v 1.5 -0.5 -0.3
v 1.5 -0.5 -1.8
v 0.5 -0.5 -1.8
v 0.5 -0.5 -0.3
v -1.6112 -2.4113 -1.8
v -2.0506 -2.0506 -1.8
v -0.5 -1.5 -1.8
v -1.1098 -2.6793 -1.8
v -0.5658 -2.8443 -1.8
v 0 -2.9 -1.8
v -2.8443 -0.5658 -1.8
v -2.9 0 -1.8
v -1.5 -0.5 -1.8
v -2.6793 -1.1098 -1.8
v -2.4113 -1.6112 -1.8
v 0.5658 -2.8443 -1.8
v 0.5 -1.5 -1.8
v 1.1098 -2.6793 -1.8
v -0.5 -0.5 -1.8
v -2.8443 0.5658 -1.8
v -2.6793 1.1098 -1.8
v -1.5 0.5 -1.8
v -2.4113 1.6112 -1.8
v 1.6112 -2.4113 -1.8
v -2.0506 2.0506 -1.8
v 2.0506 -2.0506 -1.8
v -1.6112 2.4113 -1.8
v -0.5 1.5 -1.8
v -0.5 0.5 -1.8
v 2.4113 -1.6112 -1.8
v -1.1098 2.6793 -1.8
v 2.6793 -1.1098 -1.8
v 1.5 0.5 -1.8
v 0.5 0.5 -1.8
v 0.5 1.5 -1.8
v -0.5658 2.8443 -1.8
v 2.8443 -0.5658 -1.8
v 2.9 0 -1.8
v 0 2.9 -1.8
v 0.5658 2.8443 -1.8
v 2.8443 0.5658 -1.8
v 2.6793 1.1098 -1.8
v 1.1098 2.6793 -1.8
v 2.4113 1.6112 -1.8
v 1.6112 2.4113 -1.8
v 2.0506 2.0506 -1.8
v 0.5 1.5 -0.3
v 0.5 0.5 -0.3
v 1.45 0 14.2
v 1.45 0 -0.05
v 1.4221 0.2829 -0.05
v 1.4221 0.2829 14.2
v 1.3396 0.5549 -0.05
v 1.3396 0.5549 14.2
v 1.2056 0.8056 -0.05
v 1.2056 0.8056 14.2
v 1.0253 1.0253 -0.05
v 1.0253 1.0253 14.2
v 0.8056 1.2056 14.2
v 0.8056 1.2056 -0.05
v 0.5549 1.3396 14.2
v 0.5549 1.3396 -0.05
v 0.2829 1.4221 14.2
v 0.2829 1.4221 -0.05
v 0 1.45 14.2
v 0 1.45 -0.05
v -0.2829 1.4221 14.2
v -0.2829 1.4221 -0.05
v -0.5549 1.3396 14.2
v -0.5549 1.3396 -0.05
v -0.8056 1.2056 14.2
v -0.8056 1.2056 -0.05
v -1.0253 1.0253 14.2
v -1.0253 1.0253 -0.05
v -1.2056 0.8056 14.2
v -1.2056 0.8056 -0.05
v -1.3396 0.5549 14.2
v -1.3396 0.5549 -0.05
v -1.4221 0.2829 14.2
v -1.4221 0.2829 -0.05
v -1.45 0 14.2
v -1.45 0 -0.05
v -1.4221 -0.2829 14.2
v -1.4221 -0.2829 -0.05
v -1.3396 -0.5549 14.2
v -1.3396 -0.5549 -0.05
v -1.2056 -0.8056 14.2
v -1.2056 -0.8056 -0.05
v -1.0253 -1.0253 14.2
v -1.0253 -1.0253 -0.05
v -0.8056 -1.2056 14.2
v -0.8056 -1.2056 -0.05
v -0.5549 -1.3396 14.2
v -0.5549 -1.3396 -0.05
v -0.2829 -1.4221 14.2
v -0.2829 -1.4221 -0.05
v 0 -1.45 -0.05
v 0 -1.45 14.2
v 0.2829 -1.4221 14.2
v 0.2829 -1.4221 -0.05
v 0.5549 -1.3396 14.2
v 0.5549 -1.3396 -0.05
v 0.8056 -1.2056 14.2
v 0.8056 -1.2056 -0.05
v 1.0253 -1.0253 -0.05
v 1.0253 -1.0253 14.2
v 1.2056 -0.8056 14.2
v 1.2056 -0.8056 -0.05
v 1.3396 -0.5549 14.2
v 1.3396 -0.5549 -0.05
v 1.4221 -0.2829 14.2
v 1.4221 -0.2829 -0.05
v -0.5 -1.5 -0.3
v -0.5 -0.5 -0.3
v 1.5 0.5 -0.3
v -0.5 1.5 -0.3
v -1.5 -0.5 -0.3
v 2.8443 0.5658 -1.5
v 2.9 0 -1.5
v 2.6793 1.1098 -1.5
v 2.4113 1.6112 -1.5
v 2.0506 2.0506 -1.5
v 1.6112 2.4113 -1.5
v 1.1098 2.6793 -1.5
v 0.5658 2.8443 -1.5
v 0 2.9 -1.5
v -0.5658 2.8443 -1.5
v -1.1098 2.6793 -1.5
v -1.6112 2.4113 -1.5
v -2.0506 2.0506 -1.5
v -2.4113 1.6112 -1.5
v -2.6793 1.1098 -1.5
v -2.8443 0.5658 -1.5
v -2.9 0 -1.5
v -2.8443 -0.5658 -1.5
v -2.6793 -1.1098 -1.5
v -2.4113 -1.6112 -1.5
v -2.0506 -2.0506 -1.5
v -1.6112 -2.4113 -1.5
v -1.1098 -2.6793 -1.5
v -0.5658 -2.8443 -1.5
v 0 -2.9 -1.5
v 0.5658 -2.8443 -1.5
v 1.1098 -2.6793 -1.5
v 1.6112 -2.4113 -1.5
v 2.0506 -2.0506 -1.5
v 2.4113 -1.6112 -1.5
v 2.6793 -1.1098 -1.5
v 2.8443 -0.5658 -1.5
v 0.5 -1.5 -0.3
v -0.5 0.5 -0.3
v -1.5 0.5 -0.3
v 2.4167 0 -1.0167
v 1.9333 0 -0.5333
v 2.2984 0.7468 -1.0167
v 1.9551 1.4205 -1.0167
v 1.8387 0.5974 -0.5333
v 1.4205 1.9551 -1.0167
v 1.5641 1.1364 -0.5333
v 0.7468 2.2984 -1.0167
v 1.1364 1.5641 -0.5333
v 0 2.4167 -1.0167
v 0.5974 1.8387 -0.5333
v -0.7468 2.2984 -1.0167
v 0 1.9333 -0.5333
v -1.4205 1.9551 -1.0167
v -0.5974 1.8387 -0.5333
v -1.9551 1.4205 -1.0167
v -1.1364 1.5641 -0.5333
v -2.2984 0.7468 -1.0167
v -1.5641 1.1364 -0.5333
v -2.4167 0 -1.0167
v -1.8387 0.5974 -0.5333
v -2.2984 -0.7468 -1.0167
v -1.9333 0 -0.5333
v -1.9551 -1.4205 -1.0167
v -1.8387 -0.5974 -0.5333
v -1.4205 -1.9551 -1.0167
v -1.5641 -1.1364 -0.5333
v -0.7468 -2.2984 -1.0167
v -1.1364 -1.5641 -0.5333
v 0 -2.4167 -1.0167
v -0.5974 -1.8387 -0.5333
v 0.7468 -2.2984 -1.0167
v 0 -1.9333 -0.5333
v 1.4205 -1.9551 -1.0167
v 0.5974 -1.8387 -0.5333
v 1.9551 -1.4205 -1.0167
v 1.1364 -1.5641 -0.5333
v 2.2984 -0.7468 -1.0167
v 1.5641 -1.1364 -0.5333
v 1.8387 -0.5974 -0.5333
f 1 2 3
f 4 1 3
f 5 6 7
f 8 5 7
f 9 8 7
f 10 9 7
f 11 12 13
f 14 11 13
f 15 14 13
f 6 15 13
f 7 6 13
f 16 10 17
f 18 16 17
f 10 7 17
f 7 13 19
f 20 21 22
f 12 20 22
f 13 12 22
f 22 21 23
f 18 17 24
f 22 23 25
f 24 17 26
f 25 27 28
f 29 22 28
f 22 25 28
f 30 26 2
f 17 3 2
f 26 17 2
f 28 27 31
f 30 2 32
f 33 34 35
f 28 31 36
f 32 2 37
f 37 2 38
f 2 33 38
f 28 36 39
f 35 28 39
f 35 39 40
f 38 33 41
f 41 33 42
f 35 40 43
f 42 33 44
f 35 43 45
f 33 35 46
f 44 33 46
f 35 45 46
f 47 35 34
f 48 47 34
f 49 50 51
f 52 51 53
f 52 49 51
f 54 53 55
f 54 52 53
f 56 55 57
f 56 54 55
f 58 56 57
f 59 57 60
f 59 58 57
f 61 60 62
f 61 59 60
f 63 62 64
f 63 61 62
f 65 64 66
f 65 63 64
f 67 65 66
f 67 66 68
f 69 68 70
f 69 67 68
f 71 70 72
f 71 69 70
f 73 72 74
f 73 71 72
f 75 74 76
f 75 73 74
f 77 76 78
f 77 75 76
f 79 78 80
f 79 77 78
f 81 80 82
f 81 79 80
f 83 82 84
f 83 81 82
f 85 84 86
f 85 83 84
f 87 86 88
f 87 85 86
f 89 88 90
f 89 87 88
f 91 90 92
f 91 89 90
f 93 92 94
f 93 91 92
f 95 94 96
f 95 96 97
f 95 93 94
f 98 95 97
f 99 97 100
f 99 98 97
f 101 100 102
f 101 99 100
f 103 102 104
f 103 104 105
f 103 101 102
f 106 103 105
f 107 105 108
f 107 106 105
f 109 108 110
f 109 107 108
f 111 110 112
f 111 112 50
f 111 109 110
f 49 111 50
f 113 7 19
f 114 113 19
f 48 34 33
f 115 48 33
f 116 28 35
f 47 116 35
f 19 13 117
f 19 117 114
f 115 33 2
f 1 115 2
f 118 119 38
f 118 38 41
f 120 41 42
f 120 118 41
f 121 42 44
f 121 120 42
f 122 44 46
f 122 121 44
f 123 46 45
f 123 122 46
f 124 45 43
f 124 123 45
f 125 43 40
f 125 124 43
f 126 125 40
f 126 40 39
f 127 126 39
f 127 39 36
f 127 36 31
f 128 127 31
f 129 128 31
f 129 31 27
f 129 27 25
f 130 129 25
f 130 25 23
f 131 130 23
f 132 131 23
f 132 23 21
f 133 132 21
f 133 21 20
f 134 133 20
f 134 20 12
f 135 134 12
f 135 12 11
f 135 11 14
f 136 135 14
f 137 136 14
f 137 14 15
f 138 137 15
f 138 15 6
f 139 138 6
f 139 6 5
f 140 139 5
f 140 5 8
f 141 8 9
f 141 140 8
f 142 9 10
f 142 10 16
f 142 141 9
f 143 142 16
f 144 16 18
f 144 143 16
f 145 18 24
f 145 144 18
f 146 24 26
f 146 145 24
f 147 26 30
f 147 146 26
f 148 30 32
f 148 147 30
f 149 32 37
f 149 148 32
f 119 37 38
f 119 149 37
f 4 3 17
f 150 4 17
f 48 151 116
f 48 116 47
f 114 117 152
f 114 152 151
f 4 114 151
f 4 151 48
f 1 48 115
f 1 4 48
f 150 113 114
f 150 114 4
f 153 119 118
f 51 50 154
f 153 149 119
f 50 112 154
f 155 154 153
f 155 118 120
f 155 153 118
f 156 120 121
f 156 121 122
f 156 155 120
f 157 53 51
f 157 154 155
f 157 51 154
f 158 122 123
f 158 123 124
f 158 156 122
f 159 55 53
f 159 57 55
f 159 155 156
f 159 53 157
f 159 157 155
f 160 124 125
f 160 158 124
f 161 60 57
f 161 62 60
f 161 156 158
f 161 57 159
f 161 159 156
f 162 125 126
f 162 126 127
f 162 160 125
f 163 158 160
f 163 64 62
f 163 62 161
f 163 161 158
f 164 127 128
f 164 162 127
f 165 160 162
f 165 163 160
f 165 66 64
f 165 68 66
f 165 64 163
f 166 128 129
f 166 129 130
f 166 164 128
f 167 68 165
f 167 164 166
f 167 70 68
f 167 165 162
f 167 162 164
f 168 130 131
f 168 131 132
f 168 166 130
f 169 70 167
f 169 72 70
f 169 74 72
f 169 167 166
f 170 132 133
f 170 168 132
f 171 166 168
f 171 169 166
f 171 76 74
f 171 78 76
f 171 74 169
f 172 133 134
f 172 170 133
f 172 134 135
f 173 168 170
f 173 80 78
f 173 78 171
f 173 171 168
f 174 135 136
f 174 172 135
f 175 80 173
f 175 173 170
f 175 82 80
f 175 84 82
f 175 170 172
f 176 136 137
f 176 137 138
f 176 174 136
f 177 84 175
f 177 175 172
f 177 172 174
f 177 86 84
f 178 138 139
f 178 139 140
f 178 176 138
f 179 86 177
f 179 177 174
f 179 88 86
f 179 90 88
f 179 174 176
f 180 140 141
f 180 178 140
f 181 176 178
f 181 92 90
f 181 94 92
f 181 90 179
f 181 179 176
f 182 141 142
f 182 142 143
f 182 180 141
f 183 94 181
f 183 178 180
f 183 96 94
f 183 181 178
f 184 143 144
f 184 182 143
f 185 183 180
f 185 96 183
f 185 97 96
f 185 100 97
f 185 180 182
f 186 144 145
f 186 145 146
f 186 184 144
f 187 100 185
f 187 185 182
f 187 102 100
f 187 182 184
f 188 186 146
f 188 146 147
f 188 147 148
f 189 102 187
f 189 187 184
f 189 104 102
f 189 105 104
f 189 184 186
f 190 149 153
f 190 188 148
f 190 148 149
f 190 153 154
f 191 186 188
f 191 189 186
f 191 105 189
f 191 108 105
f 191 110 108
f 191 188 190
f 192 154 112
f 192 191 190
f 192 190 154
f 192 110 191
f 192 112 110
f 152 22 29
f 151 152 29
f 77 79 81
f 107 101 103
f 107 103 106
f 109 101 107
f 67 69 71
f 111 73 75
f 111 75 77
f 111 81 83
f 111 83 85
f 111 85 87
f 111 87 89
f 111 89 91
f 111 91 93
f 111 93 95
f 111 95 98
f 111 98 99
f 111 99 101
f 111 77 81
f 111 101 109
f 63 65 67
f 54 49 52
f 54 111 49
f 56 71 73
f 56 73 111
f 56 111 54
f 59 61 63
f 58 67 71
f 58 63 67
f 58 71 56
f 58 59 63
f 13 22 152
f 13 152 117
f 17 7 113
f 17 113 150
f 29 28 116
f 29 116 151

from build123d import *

# Parameters (mm, degrees)
F0_R        = 1.45
F1_DEPTH    = 14.2
F2_R        = 2.9
F3_DEPTH    = 1.8
F4_W        = 1
F4_H        = 1
F5_DEPTH    = 1.5
F6_S5_R     = 1.45
F6_T6_DEPTH = 6


# Not quite as in the source:
# - a fillet or chamfer that OpenCascade refuses, or shapes differently, is made with other operations: its cross-section is extruded or revolved along the edge and cut away or added


with BuildPart() as f1:
    # F0 (on Top) → F1 (new body)
    with BuildSketch(Plane.XY):
        Circle(F0_R)
    extrude(amount=F1_DEPTH)

    # F2 (on Top) → F3 (join)
    with BuildSketch(Plane.XY):
        Circle(F2_R)
    extrude(amount=-F3_DEPTH)

    # F4 (on face) → F5 (cut)
    with BuildSketch(Plane(origin=(0, 0, -1.8), x_dir=(1, 0, 0), z_dir=(0, 0, -1))):
        with Locations((1, 0)):
            Rectangle(F4_W, F4_H)
        Rectangle(F4_W, F4_H)
        with Locations((0, 1)):
            Rectangle(F4_W, F4_H)
        with Locations((-1, 0)):
            Rectangle(F4_W, F4_H)
        with Locations((0, -1)):
            Rectangle(F4_W, F4_H)
    extrude(amount=-F5_DEPTH, mode=Mode.SUBTRACT)

    # F6: chamfer of 1.5 on 1 edges, made by hand


with BuildPart() as f6_tool2:
    # F6_s3 → F6_t4 (revolve)
    with BuildSketch(Plane.XZ):
        Polygon((2.9, -1.5), (1.4, 0), (2.9, 0), align=None)
    revolve(axis=Axis((0, 0, 0), (0, 0, 1)))

    # F6_s5 → F6_t6 (cut, symmetric)
    with BuildSketch(Plane.XY.offset(-0.7)):
        Circle(F6_S5_R)
    extrude(amount=F6_T6_DEPTH, both=True, mode=Mode.SUBTRACT)


with BuildPart() as f1_1:
    add(f1.part)

    # F6_t1: cut F6_tool2
    add(f6_tool2.part, mode=Mode.SUBTRACT)


solid = f1_1.part
